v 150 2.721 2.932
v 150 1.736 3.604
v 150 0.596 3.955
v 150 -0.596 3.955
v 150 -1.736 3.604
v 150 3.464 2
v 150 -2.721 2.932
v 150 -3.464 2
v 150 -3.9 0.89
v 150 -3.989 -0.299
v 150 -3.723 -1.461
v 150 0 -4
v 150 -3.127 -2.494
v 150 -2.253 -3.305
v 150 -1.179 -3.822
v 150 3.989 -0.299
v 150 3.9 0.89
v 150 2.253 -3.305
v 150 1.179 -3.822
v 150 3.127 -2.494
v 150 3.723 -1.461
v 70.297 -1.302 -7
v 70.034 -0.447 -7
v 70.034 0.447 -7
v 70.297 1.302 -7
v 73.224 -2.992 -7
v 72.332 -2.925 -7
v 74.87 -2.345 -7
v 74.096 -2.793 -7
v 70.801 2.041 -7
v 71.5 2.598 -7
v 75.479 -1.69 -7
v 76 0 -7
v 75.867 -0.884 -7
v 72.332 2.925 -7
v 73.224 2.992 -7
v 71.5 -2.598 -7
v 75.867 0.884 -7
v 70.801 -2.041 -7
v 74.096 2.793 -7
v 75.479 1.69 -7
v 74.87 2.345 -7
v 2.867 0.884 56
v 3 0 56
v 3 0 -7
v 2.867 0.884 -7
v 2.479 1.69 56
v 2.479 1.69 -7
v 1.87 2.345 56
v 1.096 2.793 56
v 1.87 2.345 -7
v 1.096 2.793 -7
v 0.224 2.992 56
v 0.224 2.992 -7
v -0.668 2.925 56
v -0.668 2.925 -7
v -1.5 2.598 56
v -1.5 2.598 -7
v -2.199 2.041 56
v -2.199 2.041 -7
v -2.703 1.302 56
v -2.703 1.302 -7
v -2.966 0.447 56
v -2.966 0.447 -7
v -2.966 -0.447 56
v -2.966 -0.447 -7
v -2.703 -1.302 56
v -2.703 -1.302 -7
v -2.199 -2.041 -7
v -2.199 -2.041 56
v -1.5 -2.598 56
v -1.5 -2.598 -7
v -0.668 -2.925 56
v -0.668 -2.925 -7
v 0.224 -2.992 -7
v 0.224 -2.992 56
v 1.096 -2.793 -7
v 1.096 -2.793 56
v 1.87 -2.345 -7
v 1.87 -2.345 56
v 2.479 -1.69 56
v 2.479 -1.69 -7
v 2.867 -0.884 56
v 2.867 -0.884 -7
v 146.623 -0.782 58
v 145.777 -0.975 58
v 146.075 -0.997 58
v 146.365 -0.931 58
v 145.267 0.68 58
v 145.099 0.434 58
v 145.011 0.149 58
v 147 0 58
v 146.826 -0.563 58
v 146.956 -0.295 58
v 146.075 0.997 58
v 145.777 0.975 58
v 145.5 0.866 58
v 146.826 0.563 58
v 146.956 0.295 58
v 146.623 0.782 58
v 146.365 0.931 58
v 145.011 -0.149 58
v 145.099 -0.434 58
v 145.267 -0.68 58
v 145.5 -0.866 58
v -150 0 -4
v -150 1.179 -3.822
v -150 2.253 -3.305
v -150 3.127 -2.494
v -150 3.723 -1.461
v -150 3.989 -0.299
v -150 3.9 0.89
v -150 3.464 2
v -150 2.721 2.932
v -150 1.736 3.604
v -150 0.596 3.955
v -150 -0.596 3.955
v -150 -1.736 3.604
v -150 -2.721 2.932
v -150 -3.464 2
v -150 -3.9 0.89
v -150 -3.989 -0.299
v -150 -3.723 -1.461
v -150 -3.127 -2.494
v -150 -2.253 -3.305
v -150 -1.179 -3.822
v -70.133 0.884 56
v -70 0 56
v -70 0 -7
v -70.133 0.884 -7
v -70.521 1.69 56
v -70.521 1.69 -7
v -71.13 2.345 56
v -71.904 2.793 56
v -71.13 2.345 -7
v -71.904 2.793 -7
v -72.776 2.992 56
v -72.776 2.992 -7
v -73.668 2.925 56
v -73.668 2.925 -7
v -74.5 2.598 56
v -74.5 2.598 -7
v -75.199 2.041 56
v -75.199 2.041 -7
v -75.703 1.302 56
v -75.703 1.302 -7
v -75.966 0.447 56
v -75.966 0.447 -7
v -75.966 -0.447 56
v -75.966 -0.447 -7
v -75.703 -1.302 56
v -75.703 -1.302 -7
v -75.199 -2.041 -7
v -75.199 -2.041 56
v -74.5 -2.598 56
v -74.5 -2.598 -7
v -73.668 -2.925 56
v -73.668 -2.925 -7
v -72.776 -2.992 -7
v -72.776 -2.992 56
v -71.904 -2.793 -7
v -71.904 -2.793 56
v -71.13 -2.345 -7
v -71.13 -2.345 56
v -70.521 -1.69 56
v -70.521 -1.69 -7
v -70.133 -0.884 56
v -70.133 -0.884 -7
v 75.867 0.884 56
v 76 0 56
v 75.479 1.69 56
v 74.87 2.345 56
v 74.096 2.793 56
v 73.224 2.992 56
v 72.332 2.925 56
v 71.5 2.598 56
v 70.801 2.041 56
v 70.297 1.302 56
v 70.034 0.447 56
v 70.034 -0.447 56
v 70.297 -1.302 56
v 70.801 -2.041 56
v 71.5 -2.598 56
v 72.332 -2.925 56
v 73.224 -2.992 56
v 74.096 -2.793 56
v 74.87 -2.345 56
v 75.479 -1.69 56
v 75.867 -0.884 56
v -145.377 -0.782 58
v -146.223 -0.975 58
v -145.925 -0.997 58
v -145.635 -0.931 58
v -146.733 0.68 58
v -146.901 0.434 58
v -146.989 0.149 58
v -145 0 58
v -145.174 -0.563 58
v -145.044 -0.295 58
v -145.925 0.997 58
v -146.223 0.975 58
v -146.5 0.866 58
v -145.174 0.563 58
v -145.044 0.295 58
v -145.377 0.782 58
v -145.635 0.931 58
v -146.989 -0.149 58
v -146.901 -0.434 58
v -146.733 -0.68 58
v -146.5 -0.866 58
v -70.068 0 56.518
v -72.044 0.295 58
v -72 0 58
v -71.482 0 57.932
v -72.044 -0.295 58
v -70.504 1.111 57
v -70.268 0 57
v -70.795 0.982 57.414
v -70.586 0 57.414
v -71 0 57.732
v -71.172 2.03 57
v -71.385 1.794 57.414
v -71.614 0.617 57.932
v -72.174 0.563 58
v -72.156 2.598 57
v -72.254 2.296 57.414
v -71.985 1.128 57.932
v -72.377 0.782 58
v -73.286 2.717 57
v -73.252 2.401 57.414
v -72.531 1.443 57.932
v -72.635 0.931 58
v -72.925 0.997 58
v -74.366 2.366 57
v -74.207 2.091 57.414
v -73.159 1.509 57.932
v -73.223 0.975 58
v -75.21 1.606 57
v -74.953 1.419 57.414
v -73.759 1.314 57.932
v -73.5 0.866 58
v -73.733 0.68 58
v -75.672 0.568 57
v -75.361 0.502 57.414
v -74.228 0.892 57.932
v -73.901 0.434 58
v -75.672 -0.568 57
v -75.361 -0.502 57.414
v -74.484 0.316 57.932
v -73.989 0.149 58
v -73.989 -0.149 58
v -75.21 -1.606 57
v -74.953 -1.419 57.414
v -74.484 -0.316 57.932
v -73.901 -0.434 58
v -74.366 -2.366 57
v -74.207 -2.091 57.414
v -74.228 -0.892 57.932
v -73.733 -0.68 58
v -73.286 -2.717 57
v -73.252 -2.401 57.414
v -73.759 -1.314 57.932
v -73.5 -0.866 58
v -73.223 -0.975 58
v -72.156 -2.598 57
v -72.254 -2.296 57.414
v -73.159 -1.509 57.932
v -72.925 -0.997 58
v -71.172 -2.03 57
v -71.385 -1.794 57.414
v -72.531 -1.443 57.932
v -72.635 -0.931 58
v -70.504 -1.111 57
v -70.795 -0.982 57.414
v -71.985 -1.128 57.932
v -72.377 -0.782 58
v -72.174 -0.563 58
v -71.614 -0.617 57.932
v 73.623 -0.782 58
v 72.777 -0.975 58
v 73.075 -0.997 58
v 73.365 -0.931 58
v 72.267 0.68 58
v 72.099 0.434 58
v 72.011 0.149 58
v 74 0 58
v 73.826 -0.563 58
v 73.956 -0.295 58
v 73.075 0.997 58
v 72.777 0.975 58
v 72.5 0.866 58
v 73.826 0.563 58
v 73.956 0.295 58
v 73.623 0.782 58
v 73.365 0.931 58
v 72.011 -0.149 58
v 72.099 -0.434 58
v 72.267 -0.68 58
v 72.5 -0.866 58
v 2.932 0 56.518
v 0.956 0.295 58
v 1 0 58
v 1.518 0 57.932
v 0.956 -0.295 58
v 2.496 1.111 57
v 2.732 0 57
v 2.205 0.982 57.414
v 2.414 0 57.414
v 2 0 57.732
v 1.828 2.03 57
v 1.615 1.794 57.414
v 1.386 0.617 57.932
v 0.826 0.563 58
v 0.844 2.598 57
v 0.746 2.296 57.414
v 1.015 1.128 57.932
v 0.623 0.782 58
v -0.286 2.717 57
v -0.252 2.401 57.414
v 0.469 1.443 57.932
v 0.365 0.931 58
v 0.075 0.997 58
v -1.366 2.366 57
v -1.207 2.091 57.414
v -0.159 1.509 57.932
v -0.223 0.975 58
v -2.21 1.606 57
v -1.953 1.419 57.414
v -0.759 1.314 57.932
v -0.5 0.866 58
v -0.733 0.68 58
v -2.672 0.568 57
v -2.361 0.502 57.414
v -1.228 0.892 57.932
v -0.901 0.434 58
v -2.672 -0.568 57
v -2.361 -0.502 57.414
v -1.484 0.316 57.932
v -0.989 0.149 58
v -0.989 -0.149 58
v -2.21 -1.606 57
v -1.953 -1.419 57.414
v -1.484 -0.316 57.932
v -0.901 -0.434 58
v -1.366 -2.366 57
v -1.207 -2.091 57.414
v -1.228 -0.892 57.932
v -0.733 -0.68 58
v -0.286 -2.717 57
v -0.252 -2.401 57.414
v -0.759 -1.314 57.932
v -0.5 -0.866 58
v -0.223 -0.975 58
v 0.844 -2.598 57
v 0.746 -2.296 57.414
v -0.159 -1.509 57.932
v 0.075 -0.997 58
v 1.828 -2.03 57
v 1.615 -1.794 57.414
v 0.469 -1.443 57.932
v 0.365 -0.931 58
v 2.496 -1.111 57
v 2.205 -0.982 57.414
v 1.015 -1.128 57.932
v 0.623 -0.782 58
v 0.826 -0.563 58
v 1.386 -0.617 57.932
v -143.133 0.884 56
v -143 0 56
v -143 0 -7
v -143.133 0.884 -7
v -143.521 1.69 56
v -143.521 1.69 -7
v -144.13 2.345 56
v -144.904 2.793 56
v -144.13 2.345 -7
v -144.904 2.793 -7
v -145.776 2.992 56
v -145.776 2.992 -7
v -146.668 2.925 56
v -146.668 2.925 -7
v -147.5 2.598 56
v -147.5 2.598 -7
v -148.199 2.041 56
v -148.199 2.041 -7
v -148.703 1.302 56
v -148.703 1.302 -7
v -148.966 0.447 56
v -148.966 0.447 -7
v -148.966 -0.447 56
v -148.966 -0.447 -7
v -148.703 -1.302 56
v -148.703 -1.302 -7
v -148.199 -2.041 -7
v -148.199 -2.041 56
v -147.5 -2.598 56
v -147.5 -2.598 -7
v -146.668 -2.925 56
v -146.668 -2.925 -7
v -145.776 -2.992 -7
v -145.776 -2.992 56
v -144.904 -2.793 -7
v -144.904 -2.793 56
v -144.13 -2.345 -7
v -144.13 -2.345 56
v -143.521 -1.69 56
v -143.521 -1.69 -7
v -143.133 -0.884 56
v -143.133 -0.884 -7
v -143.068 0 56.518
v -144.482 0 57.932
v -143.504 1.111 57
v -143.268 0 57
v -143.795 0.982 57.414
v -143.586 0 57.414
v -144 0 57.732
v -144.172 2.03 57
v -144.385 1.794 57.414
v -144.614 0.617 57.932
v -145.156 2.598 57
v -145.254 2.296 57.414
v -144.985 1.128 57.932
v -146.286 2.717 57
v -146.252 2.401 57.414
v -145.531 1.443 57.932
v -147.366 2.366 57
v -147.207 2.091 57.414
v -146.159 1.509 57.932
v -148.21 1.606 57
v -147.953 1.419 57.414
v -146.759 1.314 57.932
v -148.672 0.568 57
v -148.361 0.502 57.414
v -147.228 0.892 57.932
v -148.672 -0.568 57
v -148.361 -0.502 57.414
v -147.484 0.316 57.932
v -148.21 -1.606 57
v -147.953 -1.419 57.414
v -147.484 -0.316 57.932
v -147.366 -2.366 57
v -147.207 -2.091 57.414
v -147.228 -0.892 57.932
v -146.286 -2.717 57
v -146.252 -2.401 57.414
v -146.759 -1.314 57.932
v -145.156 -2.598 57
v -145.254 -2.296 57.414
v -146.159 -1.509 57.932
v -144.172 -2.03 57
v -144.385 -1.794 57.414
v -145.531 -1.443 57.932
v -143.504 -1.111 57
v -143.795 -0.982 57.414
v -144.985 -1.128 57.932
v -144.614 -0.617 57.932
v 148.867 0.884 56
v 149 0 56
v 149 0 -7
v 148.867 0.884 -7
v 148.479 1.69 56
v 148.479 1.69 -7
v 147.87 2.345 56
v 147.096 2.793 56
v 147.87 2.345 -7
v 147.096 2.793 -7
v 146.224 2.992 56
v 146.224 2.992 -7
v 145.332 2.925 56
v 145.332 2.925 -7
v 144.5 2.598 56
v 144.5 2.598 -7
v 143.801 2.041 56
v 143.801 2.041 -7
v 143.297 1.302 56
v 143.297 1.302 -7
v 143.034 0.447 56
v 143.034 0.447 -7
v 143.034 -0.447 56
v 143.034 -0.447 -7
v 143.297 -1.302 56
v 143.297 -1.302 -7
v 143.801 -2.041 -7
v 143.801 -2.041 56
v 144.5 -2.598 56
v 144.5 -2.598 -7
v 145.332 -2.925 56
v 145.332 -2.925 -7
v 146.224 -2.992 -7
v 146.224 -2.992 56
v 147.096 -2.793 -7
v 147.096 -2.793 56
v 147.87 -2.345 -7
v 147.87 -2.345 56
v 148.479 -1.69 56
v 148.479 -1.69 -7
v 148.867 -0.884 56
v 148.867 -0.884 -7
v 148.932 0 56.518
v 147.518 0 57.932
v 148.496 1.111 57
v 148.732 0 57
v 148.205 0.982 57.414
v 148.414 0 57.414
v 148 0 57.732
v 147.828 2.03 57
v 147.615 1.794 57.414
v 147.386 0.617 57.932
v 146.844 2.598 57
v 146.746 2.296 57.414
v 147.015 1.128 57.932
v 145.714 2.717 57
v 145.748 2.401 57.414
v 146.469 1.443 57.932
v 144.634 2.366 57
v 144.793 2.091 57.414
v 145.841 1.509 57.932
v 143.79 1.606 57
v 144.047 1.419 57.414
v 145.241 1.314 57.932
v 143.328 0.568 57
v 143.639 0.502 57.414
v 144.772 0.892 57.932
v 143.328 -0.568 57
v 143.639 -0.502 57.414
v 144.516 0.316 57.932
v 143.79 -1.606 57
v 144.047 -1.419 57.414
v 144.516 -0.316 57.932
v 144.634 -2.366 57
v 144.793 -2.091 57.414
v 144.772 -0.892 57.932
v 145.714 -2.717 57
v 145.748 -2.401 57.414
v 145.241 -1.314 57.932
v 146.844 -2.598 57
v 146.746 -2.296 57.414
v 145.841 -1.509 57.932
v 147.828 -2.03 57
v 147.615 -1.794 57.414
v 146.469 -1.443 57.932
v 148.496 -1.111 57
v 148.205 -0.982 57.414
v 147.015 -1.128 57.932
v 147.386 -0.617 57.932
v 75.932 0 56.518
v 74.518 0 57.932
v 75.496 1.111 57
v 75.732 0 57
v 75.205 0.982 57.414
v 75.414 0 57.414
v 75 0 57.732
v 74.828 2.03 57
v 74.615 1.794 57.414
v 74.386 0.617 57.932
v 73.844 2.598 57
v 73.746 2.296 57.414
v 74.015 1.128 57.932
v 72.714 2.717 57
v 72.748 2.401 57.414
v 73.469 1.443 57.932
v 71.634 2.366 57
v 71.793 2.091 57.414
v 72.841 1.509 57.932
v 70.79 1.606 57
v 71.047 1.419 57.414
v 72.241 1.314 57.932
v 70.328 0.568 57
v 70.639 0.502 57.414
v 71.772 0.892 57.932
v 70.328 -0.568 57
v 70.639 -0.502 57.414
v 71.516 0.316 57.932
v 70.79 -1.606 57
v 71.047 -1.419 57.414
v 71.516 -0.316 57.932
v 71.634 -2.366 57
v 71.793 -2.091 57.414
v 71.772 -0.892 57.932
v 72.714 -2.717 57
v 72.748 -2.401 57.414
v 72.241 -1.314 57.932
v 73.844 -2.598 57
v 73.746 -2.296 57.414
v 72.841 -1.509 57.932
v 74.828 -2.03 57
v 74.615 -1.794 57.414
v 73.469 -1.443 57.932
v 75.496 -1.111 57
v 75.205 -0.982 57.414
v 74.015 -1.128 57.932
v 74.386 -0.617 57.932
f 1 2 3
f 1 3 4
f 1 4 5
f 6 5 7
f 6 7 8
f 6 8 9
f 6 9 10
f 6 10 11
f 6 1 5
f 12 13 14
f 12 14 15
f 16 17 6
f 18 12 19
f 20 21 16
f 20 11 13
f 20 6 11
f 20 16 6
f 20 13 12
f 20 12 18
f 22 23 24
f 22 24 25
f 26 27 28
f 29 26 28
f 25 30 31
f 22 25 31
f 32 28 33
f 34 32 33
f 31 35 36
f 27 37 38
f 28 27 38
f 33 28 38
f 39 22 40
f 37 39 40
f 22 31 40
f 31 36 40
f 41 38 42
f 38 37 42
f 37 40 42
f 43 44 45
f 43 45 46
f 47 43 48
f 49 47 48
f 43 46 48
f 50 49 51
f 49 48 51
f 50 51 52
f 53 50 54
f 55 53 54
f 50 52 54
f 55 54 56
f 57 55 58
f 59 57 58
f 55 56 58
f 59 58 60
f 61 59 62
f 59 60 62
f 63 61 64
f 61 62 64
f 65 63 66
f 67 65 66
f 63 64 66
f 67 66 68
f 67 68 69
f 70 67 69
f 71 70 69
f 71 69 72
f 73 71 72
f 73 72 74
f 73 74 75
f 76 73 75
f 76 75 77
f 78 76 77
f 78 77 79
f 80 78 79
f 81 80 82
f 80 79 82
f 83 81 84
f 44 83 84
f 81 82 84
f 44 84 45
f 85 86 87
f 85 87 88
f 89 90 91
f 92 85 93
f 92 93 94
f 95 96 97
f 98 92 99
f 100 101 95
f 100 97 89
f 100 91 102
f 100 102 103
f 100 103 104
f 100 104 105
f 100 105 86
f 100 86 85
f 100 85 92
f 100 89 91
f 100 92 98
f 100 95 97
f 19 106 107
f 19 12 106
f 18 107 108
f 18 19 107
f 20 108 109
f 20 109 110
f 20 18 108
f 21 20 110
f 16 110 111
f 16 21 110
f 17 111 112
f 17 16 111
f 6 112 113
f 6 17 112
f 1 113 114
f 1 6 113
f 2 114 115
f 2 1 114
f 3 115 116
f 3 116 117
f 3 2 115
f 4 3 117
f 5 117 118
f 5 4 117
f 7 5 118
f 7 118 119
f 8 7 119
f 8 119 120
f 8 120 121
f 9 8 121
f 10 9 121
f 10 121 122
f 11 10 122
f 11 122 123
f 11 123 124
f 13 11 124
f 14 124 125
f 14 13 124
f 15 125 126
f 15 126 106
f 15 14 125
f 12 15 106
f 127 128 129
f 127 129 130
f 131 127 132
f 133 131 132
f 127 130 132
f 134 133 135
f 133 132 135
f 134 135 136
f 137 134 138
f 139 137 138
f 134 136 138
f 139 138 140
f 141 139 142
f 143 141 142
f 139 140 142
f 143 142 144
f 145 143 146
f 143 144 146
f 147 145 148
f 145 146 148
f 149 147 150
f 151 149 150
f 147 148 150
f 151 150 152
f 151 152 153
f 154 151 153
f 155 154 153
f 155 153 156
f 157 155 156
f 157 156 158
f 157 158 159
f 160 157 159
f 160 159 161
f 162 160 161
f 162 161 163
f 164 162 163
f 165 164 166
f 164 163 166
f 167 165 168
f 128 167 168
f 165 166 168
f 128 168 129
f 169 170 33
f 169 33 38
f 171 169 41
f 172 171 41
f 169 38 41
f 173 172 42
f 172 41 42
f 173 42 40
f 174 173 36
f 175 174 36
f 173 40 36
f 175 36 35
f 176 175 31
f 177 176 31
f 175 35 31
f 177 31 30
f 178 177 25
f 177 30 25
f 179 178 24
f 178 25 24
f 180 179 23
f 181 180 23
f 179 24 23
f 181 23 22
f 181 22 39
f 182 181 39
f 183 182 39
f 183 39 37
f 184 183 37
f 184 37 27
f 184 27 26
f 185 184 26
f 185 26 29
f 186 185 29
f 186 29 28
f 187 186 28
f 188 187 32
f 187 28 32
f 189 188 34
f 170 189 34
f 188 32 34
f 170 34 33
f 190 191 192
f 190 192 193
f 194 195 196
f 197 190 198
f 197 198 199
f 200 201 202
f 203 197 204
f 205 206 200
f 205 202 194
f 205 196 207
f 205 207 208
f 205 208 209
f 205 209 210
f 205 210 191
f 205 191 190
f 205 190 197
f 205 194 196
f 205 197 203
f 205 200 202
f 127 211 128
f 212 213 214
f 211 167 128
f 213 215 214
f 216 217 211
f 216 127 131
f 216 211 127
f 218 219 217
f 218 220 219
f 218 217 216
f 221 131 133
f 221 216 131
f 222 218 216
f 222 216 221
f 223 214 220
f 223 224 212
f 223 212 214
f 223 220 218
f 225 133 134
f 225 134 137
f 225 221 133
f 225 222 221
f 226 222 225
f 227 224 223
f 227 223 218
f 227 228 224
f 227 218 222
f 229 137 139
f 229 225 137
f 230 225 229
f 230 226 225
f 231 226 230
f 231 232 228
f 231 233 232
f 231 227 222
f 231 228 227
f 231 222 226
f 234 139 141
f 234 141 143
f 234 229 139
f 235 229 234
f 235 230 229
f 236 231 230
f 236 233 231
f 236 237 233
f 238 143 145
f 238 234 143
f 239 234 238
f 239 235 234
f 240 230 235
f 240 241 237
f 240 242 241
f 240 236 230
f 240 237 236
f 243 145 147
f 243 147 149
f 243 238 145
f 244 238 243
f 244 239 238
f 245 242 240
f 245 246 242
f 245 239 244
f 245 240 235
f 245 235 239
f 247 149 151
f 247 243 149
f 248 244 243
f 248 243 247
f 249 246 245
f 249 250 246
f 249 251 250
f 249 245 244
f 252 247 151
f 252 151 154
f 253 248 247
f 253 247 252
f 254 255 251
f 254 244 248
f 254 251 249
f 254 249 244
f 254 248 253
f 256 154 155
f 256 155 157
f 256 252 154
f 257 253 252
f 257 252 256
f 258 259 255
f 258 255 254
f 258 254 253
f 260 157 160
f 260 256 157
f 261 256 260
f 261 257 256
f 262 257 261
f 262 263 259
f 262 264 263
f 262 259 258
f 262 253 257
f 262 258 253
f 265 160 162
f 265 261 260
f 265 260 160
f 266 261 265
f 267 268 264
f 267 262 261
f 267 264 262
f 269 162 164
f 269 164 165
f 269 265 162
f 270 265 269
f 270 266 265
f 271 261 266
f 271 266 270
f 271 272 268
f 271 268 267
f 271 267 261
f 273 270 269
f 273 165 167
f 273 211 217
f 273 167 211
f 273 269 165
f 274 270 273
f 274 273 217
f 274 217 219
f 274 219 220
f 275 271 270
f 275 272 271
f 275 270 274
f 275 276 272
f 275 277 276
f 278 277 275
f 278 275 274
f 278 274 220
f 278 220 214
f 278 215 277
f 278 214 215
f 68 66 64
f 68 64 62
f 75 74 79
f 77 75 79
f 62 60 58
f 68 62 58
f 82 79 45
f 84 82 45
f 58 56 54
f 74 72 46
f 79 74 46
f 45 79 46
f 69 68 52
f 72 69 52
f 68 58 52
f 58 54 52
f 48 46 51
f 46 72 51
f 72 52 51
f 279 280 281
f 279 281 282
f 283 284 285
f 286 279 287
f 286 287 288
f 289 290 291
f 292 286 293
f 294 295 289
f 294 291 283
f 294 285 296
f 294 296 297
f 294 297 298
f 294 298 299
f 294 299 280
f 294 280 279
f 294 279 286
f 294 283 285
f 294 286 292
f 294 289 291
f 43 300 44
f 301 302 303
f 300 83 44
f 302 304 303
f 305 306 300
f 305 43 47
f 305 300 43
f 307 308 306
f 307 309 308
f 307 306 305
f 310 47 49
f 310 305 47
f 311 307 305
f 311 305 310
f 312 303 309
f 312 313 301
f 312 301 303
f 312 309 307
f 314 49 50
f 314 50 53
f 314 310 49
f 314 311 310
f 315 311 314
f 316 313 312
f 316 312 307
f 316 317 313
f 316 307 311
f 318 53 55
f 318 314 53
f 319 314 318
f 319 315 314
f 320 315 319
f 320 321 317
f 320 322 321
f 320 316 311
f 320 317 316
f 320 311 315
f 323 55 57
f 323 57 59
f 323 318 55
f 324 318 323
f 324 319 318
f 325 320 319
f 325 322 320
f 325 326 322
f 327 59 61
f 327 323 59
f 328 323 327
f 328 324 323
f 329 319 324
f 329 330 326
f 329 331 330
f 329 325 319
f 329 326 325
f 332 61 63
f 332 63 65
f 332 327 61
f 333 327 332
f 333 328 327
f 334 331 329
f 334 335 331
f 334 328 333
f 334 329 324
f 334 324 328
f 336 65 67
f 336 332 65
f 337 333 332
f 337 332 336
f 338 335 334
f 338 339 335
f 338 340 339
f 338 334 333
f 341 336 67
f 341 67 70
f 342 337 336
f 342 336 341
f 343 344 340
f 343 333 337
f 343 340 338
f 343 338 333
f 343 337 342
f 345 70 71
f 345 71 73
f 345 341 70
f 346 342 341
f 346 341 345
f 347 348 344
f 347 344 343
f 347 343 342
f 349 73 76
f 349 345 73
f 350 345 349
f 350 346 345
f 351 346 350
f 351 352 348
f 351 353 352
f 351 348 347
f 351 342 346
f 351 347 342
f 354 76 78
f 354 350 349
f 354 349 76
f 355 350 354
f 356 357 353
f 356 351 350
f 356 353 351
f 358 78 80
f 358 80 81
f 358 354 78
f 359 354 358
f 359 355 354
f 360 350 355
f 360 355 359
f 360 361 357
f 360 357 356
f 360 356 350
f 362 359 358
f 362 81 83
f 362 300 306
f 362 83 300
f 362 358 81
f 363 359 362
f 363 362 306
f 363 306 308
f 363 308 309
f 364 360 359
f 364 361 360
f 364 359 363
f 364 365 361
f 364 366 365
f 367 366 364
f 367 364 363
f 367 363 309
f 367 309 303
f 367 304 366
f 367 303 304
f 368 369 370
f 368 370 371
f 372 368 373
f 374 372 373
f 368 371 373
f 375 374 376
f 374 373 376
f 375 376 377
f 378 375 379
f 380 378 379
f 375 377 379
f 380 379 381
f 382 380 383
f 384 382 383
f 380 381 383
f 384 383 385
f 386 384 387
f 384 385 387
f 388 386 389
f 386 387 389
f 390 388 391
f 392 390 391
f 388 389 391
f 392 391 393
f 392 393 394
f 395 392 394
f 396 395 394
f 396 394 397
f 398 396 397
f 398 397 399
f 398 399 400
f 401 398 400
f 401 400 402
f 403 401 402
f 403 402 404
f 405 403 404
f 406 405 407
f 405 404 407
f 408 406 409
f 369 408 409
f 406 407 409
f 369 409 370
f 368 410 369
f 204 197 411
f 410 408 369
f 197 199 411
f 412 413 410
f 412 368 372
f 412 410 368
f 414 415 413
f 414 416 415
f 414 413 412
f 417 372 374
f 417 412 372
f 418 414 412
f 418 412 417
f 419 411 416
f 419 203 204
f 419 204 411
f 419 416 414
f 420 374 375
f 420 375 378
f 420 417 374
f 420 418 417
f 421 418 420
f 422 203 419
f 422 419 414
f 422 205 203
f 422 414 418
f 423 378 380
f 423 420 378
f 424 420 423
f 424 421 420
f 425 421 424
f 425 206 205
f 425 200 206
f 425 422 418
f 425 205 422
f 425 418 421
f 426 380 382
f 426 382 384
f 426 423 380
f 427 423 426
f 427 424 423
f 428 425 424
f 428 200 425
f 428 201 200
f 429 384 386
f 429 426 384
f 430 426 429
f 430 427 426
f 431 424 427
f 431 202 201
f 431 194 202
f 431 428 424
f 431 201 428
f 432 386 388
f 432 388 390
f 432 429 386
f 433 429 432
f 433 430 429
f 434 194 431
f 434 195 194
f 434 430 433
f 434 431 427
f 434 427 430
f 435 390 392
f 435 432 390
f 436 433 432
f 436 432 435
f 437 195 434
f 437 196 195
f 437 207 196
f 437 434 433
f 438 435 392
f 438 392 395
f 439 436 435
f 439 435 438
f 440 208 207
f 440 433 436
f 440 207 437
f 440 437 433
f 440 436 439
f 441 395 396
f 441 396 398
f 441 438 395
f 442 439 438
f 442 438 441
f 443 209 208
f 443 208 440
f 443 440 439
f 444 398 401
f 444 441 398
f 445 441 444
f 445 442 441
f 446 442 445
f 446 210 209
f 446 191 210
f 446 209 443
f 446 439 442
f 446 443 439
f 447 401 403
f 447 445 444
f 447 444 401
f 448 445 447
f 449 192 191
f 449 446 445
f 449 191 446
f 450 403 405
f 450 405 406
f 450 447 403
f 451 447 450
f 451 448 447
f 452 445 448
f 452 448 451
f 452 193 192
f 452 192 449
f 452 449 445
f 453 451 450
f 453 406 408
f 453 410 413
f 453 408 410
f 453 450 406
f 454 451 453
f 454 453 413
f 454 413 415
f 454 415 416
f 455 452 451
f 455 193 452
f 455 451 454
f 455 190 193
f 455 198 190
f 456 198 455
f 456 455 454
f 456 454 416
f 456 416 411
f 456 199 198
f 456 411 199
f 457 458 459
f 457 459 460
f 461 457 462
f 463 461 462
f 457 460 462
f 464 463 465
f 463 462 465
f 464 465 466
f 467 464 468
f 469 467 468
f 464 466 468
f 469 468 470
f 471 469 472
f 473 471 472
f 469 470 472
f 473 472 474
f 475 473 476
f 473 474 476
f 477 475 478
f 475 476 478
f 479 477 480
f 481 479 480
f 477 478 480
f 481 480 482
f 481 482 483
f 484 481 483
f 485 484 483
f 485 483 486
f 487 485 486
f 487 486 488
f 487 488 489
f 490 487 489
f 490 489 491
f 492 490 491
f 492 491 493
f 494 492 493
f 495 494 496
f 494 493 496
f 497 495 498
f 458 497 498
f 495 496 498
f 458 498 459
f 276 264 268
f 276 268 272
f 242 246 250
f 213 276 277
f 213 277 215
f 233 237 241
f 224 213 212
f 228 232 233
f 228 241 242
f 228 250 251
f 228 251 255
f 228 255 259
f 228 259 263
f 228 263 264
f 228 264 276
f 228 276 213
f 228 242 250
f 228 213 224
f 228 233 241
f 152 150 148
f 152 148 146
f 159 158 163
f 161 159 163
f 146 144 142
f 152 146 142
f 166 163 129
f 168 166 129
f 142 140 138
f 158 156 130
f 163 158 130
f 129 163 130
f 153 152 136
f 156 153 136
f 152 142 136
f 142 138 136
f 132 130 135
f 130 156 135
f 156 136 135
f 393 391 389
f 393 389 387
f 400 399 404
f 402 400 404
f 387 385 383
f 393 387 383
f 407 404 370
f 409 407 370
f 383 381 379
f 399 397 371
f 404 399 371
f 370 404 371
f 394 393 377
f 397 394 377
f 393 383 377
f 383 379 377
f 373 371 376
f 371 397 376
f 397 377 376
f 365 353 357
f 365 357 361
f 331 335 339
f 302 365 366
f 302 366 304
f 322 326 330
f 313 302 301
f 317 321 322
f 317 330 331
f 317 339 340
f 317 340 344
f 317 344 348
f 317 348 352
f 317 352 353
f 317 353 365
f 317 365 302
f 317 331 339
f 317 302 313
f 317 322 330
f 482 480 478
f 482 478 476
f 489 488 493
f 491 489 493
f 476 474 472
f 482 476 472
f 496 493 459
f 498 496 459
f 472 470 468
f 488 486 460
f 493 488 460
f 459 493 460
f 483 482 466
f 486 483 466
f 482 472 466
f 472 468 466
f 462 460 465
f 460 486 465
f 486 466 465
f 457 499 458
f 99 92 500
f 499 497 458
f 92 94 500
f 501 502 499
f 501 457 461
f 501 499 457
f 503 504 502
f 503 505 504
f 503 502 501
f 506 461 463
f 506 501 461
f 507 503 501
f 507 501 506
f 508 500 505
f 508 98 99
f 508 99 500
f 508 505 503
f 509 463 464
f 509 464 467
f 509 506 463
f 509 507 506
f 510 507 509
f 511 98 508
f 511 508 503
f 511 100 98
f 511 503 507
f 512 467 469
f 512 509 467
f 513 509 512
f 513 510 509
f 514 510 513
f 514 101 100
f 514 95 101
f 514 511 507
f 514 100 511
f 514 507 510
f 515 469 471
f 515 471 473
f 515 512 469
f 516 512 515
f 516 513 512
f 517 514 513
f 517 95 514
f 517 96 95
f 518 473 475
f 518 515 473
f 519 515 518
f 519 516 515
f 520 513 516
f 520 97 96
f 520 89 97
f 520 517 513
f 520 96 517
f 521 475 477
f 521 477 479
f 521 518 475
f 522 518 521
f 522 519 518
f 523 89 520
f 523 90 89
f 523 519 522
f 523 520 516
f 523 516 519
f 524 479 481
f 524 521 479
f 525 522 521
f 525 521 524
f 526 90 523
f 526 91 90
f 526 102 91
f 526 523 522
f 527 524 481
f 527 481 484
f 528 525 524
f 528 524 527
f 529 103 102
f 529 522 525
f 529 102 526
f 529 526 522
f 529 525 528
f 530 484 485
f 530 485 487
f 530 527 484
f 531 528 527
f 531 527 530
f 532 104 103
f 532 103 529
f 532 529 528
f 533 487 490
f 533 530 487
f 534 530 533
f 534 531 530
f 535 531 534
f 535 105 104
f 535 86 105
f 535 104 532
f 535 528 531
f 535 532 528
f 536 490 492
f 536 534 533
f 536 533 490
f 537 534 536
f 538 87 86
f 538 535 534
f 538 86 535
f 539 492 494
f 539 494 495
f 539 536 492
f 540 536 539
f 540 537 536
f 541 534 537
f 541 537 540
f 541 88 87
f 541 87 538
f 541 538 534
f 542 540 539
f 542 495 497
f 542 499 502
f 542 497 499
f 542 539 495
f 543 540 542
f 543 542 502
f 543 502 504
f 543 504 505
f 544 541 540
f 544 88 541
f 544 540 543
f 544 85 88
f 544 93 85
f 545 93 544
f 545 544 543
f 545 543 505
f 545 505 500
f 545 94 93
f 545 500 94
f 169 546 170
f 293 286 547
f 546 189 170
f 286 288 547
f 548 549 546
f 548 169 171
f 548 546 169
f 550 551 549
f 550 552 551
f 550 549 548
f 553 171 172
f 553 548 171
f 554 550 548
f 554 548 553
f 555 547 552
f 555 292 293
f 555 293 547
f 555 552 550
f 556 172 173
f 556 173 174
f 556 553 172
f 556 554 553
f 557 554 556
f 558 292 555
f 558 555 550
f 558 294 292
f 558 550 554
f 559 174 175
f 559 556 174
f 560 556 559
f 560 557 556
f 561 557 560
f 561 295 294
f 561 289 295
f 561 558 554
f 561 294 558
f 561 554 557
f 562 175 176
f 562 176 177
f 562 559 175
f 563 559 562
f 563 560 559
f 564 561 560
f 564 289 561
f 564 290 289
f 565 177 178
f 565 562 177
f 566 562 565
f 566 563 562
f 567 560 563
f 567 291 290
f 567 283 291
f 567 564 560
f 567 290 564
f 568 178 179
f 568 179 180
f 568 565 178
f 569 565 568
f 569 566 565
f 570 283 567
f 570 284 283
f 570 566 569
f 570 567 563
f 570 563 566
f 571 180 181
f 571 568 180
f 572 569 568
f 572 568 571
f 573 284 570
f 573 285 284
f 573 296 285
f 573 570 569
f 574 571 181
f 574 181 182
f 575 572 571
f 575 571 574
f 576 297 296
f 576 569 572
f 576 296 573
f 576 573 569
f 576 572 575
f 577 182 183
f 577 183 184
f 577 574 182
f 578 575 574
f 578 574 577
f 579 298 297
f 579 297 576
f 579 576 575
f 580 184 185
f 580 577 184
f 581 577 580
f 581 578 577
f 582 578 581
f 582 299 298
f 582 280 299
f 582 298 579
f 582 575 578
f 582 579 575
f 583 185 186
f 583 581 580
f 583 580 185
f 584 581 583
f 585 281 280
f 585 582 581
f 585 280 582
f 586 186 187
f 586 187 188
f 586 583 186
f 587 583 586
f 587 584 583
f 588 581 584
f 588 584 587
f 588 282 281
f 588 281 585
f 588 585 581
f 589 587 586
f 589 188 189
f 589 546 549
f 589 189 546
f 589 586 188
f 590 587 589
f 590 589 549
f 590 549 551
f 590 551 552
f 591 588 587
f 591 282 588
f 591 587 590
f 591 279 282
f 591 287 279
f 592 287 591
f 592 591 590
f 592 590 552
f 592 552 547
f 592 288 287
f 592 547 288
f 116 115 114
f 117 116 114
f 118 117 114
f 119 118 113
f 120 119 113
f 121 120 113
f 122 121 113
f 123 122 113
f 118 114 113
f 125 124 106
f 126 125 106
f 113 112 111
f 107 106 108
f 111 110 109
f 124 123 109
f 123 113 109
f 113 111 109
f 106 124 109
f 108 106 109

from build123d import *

# Parameters (mm, degrees)
ESQUISSE1_R                  = 4
BOSS_EXTRU_1_DEPTH           = 150
BOSS_EXTRU_3_START           = -7
ESQUISSE3_R                  = 3
BOSS_EXTRU_3_DEPTH           = 65
CONG_1_R                     = 2
R_P_TITION_LIN_AIRE1_COUNT   = 3
R_P_TITION_LIN_AIRE1_PITCH   = 73
R_P_TITION_LIN_AIRE1_2_COUNT = 3
R_P_TITION_LIN_AIRE1_2_PITCH = 73


with BuildPart() as part:
    # Esquisse1 → Boss.-Extru.1 (new, symmetric)
    with BuildSketch(Plane(origin=(0, 0, 0), x_dir=(0, 0, -1), z_dir=(1, 0, 0))):
        Circle(ESQUISSE1_R)
    extrude(amount=BOSS_EXTRU_1_DEPTH, both=True)


with BuildPart() as body_2:
    # Esquisse3 → Boss.-Extru.3 (new body)
    with BuildSketch(Plane.XY.offset(BOSS_EXTRU_3_START)):
        Circle(ESQUISSE3_R)
    extrude(amount=BOSS_EXTRU_3_DEPTH)

    # Congé1
    cong_1_edges = [body_2.edges().sort_by_distance(p)[0] for p in [
        (-3, 0, 58),
    ]]
    fillet(cong_1_edges, radius=CONG_1_R)


with BuildPart() as r_p_tition_lin_aire1_1:
    # Répétition linéaire1: pattern copy
    add(body_2.part.moved(Location(Vector(1, 0, 0) * (1 * R_P_TITION_LIN_AIRE1_PITCH))))


with BuildPart() as r_p_tition_lin_aire1_2:
    # Répétition linéaire1: pattern copy
    add(body_2.part.moved(Location(Vector(1, 0, 0) * (2 * R_P_TITION_LIN_AIRE1_PITCH))))


with BuildPart() as r_p_tition_lin_aire1_2_1:
    # R_p_tition lin_aire1 2: pattern copy
    add(body_2.part.moved(Location(Vector(-1, 0, 0) * (1 * R_P_TITION_LIN_AIRE1_2_PITCH))))


with BuildPart() as r_p_tition_lin_aire1_2_2:
    # R_p_tition lin_aire1 2: pattern copy
    add(body_2.part.moved(Location(Vector(-1, 0, 0) * (2 * R_P_TITION_LIN_AIRE1_2_PITCH))))


solid = Compound([part.part, body_2.part, r_p_tition_lin_aire1_1.part, r_p_tition_lin_aire1_2.part, r_p_tition_lin_aire1_2_1.part, r_p_tition_lin_aire1_2_2.part])
